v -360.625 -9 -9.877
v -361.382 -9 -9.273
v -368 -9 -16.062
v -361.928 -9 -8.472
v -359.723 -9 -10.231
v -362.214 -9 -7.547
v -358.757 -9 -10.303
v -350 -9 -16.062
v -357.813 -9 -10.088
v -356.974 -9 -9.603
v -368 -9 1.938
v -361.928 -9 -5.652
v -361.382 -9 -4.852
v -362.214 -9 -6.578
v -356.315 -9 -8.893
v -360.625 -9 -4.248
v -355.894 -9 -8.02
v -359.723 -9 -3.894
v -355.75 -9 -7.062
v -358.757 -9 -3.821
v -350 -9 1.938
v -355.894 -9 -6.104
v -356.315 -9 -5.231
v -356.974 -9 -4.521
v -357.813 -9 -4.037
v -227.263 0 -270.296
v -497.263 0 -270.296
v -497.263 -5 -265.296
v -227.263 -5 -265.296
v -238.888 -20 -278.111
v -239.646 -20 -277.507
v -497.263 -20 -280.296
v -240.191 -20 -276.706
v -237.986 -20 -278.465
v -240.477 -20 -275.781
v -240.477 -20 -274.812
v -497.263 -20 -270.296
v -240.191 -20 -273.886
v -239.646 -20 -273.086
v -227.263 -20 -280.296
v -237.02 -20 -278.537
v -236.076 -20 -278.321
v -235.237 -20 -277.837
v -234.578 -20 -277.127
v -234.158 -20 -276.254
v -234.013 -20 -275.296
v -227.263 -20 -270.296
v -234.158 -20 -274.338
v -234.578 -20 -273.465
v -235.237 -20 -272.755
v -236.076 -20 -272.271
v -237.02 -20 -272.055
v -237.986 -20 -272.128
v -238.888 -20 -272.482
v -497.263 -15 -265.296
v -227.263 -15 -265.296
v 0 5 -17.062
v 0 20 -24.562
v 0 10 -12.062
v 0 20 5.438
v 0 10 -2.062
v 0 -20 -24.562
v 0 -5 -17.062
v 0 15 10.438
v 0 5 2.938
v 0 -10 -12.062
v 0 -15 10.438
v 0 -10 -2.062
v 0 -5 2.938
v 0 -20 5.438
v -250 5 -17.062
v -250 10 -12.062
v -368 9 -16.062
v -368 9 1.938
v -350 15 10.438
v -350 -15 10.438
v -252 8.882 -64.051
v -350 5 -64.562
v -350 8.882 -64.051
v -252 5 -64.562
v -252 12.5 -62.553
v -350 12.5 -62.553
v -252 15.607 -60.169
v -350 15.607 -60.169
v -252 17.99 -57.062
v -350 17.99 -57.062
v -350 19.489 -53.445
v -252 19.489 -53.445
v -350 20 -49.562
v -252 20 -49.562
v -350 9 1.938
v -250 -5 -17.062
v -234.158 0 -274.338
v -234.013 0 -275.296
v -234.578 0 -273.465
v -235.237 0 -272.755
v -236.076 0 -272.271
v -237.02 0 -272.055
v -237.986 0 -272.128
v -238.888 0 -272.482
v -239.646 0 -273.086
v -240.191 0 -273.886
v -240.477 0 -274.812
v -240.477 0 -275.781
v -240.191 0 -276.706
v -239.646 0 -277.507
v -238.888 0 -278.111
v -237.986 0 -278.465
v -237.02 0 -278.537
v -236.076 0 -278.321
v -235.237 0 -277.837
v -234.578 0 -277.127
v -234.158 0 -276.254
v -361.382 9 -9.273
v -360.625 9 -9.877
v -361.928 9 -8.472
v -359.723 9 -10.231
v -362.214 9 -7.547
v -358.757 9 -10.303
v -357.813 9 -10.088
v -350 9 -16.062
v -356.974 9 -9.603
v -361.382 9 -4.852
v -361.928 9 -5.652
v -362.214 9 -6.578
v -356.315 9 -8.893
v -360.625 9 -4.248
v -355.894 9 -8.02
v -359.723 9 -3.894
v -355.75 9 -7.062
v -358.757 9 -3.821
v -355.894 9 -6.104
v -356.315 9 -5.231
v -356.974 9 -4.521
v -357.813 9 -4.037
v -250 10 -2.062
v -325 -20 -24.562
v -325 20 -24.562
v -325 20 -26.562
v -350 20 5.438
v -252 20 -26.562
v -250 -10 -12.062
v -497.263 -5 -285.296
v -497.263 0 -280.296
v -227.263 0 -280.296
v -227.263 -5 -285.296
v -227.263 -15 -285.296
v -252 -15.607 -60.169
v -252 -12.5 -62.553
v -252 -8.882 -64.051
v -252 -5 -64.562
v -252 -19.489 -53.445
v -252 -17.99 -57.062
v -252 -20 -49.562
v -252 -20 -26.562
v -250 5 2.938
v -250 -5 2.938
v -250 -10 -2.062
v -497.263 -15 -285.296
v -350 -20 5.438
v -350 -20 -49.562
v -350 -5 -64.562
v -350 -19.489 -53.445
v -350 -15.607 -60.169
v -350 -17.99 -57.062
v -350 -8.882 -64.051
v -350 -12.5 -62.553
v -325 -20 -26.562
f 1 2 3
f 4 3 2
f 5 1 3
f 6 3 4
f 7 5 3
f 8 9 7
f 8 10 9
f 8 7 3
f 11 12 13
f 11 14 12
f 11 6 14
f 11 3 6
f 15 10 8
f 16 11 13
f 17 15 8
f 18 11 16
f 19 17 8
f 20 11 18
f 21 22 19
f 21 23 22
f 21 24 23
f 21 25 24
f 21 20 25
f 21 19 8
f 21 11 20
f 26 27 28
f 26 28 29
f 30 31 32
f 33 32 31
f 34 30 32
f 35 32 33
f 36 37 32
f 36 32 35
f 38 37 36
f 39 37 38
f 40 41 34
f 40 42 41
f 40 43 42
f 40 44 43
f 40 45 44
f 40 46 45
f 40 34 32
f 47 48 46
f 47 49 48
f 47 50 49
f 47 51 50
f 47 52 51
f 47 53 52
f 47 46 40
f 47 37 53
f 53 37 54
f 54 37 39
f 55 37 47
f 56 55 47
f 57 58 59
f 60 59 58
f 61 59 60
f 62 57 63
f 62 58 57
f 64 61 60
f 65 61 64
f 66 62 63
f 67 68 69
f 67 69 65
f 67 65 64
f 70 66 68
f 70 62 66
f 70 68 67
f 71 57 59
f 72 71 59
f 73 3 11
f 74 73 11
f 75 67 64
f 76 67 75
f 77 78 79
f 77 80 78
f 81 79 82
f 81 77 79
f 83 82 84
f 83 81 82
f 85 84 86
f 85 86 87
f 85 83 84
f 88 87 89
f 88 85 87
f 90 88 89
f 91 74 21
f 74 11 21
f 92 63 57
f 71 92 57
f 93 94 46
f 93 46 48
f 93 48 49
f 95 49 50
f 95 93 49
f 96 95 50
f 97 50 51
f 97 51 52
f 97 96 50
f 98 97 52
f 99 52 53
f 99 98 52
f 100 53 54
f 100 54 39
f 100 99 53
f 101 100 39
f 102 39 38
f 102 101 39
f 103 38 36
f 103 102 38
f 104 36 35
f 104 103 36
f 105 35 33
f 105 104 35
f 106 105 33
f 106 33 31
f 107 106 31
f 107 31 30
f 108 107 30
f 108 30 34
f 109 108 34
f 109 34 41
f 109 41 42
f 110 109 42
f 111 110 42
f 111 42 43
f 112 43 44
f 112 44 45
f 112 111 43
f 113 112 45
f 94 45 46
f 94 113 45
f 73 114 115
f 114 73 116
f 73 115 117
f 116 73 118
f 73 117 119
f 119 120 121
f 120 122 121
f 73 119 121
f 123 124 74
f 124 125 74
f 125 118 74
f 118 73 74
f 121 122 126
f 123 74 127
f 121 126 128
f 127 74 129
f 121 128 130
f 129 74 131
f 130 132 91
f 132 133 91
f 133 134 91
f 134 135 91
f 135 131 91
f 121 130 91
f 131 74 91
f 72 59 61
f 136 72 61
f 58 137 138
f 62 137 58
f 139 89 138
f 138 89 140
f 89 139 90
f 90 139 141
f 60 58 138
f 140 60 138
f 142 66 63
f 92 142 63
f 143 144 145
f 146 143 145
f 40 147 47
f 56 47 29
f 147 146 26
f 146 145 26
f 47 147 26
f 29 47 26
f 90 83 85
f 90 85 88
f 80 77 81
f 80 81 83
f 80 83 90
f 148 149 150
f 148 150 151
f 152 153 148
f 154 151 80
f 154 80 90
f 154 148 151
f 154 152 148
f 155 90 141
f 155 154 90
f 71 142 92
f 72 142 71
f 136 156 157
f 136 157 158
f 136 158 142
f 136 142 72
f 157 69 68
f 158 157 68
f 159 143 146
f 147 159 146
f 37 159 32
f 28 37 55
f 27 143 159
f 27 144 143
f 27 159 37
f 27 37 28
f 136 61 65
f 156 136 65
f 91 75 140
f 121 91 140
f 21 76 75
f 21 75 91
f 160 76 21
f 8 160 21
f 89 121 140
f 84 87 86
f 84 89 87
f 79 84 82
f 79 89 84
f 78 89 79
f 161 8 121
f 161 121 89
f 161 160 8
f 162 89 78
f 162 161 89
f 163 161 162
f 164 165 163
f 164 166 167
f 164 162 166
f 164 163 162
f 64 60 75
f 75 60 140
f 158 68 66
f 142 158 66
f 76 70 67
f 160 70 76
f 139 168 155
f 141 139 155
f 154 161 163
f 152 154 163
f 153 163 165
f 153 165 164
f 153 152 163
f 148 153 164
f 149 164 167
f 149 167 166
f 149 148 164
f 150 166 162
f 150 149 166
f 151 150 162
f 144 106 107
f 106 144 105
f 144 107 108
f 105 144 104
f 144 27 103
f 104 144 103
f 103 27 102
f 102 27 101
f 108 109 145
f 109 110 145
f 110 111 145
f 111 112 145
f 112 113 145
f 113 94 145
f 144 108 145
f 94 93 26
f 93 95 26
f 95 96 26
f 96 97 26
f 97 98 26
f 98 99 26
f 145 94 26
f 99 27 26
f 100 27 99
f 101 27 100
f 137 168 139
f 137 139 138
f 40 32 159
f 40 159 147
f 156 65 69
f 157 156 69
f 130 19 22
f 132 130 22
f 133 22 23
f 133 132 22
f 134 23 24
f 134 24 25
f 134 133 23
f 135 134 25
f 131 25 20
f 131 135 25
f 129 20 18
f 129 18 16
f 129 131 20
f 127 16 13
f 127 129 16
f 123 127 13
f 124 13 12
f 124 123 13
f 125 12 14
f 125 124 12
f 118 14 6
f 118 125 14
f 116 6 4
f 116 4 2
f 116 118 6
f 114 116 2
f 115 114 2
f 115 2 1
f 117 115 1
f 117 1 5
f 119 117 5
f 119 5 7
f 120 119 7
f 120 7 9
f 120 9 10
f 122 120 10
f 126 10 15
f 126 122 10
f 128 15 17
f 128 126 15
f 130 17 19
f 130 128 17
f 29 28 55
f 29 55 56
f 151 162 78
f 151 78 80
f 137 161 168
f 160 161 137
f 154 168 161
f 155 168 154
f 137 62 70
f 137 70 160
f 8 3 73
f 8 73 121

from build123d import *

# Parameters (mm, degrees)
F0_W          = 18
F0_H          = 18
F0_R          = 3.25
F1_DEPTH      = 9
F1_DEPTH_BACK = 9
F0_W_2        = 325
F0_H_2        = 35
F0_W_3        = 73
F0_H_3        = 38
F2_DEPTH      = 20
F2_DEPTH_BACK = 20
F3_SIZE       = 5
F4_R          = 15
F6_DEPTH      = 250
F0_W_4        = 270
F0_H_4        = 20
F7_DEPTH      = 20
F8_SIZE       = 5


with BuildPart() as f1:
    # F0 (on Front) → F1 (new body, two sides)
    with BuildSketch(Plane.XZ) as f1_sk:
        with Locations((-359, -7.062235)):
            Rectangle(F0_W, F0_H)
        with Locations((-359, -7.062235)):
            Circle(F0_R, mode=Mode.SUBTRACT)
    extrude(amount=F1_DEPTH)
    extrude(f1_sk.sketch, amount=-F1_DEPTH_BACK)

    # F0 (on Front) → F2 (join, two sides)
    with BuildSketch(Plane.XZ) as f2_sk:
        Polygon((-350, 1.937765), (-350, -16.062235), (-350, -64.562235), (-325, -64.562235), (-325, -26.562235), (-325, -24.562235), (-325, 10.437765), (-350, 10.437765), align=None)
        with Locations((-162.5, -7.062235)):
            Rectangle(F0_W_2, F0_H_2)
        with Locations((-288.5, -45.562235)):
            Rectangle(F0_W_3, F0_H_3)
    extrude(amount=F2_DEPTH)
    extrude(f2_sk.sketch, amount=-F2_DEPTH_BACK)

    # F3
    f3_edges = [f1.edges().sort_by_distance(p)[0] for p in [
        (-175, 20, 10.437765),
        (-175, -20, 10.437765),
    ]]
    chamfer(f3_edges, length=F3_SIZE)

    # F4
    f4_edges = [f1.edges().sort_by_distance(p)[0] for p in [
        (-301, 20, -64.562235),
        (-301, -20, -64.562235),
    ]]
    fillet(f4_edges, radius=F4_R)

    # F5 (on face) → F6 (cut)
    with BuildSketch(Plane.YZ):
        Polygon((-10, -12.062235), (-5, -17.062235), (-5, -12.062235), align=None)
        Polygon((-5, -12.062235), (-5, -17.062235), (5, -17.062235), (5, -12.062235), (10, -12.062235), (10, -2.062235), (5, -2.062235), (5, 2.937765), (-5, 2.937765), (-5, -2.062235), (-10, -2.062235), (-10, -12.062235), align=None)
        Polygon((5, -12.062235), (5, -17.062235), (10, -12.062235), align=None)
        Polygon((5, -2.062235), (10, -2.062235), (5, 2.937765), align=None)
        Polygon((-5, 2.937765), (-10, -2.062235), (-5, -2.062235), align=None)
    extrude(amount=-F6_DEPTH, mode=Mode.SUBTRACT)


with BuildPart() as f7:
    # F0 (on Front) → F7 (new body)
    with BuildSketch(Plane.XZ):
        with Locations((-362.263223, -275.296142)):
            Rectangle(F0_W_4, F0_H_4)
        with Locations((-237.263223, -275.296142)):
            Circle(F0_R, mode=Mode.SUBTRACT)
    extrude(amount=F7_DEPTH)

    # F8
    f8_edges = [f7.edges().sort_by_distance(p)[0] for p in [
        (-362.263223, 0, -285.296142),
        (-362.263223, 0, -265.296142),
        (-362.263223, -20, -265.296142),
        (-362.263223, -20, -285.296142),
    ]]
    chamfer(f8_edges, length=F8_SIZE)


solid = Compound([f1.part, f7.part])
